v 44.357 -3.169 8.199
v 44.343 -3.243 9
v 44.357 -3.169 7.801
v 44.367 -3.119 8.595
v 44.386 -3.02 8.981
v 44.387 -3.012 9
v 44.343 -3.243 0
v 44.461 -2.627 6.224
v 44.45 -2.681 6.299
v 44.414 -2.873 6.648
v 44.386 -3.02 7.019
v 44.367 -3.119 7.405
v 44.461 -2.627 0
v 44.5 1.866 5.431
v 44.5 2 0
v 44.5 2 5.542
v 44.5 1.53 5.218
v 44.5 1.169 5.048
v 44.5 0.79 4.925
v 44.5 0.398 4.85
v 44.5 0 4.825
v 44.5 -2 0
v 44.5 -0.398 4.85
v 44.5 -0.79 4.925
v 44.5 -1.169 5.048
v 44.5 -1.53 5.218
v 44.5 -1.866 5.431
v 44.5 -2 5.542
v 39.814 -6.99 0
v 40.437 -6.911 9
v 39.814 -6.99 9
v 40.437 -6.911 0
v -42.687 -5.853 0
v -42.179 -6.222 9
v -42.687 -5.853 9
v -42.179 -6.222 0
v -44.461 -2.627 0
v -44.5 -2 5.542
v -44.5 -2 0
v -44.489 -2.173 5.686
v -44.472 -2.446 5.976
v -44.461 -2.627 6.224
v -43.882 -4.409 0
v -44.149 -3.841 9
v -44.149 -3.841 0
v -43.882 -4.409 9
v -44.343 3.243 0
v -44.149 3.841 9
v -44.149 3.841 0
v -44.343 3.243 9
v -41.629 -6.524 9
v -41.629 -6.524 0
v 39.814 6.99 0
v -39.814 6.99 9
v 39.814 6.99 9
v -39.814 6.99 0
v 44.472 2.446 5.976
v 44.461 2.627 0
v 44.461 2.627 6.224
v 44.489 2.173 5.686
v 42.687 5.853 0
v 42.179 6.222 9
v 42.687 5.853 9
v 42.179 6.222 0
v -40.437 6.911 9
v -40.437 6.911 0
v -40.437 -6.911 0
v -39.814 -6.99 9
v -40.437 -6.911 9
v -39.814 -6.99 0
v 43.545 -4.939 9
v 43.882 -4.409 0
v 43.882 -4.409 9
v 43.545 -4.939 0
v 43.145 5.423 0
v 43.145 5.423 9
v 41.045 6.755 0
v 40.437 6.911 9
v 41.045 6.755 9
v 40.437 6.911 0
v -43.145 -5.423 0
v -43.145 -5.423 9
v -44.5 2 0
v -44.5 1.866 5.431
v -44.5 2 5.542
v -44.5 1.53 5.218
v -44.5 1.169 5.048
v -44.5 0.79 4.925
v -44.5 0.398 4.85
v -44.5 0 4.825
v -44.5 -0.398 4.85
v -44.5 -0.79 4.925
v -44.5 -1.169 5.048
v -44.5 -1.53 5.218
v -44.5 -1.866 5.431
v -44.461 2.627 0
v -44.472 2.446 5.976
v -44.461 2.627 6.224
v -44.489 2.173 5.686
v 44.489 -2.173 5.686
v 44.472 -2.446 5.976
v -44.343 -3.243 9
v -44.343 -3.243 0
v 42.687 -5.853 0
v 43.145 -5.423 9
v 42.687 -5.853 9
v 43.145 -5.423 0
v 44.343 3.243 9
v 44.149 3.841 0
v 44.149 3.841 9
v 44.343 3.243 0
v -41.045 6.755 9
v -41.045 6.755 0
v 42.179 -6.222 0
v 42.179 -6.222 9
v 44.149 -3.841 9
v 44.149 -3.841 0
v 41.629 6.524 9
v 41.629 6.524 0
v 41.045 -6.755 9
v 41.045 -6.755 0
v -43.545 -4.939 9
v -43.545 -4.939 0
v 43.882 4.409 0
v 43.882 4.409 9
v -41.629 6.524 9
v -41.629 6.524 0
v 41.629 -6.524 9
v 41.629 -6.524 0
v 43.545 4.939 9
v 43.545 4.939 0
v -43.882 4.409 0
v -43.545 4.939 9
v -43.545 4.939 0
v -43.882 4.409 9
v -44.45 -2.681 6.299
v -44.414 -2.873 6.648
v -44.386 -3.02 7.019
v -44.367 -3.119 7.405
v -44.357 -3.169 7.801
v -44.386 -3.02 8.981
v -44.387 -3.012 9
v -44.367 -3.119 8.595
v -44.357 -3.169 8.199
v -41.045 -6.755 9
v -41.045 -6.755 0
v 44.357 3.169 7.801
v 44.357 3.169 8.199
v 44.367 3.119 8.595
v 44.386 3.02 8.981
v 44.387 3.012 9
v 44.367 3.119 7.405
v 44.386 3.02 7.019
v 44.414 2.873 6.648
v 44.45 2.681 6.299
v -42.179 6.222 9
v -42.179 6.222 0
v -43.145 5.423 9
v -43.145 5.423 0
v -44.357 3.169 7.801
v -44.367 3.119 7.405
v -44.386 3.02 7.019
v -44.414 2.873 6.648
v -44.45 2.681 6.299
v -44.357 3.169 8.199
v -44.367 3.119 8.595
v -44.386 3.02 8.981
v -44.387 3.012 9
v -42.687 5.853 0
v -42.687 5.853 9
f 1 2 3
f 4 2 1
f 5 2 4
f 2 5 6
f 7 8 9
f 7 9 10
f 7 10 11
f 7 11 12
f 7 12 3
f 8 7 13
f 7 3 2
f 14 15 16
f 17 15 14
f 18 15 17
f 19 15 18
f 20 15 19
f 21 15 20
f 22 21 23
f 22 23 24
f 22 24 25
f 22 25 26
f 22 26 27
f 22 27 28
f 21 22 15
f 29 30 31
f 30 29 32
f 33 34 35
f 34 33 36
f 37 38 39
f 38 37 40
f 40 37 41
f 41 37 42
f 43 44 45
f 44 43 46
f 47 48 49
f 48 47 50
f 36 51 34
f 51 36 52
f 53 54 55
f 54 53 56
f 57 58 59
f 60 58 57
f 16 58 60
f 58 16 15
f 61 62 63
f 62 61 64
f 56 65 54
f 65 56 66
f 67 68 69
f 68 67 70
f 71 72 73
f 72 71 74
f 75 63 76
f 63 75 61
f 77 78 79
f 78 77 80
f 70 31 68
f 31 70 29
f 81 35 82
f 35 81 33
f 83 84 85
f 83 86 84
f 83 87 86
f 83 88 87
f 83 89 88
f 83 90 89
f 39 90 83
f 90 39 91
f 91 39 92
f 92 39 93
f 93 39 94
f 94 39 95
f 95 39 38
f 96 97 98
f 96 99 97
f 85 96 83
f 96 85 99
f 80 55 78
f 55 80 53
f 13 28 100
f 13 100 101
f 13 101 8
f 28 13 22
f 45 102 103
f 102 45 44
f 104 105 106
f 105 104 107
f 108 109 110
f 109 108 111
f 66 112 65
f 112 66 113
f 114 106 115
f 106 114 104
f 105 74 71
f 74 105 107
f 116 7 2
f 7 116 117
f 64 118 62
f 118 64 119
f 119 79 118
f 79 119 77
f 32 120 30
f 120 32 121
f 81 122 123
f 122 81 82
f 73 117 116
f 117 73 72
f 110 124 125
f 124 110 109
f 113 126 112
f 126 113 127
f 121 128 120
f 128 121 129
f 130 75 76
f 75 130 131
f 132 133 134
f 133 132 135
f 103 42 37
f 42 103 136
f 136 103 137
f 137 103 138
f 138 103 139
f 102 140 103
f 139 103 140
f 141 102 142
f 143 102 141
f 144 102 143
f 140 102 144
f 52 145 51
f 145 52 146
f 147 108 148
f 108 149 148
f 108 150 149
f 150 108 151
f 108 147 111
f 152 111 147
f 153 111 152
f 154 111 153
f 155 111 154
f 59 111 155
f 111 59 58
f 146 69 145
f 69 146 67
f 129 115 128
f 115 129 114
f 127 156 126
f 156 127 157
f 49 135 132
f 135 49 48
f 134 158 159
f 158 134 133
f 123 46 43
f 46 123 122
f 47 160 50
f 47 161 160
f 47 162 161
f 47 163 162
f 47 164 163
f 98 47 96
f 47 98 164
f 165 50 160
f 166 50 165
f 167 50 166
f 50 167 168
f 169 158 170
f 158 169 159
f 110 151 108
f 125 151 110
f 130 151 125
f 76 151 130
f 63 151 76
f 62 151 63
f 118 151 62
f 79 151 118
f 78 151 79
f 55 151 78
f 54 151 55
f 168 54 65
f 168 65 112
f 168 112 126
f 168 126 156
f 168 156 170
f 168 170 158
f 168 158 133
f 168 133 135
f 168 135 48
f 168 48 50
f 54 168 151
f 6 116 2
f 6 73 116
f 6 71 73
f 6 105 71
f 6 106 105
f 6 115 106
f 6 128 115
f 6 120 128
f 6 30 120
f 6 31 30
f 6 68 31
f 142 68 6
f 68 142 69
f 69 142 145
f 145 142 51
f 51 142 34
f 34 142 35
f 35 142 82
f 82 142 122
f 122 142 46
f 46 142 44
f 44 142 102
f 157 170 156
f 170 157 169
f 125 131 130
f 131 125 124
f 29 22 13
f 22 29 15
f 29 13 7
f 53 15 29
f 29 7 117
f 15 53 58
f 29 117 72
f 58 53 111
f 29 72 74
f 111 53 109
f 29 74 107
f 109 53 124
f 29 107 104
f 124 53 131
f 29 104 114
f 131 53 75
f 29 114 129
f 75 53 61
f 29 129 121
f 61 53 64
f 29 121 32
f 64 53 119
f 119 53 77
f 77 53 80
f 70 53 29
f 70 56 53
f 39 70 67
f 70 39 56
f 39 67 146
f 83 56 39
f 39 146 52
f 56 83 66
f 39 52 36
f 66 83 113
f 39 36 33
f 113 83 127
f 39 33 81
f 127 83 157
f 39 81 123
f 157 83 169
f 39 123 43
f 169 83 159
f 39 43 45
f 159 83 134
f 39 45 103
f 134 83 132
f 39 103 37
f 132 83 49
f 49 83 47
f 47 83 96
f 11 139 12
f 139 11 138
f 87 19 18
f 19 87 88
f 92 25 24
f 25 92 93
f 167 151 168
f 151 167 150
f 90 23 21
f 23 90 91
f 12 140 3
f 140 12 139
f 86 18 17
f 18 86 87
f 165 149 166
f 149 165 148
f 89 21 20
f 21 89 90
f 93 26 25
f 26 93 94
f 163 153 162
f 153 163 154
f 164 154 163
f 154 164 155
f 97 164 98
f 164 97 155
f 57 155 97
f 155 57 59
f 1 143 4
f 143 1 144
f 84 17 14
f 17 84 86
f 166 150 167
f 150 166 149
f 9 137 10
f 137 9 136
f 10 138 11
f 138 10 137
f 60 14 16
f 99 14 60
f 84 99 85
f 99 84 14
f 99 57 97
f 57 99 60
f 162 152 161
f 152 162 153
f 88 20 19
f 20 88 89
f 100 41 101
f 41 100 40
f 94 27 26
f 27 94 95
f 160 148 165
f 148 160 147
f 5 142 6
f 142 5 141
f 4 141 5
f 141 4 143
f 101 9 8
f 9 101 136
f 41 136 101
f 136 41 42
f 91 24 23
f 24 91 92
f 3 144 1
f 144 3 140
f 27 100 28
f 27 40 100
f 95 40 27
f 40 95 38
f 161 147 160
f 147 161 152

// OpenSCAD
$fn = 50;


difference() {
	union() {
		hull() {
			translate(v = [-39.5000000000, 2.0000000000, 0]) {
				cylinder(h = 9, r = 5);
			}
			translate(v = [39.5000000000, 2.0000000000, 0]) {
				cylinder(h = 9, r = 5);
			}
			translate(v = [-39.5000000000, -2.0000000000, 0]) {
				cylinder(h = 9, r = 5);
			}
			translate(v = [39.5000000000, -2.0000000000, 0]) {
				cylinder(h = 9, r = 5);
			}
		}
	}
	union() {
		#translate(v = [-45.0000000000, 0, 8.0000000000]) {
			rotate(a = [0, 90, 0]) {
				cylinder(h = 90, r = 3.1750000000);
			}
		}
	}
}
